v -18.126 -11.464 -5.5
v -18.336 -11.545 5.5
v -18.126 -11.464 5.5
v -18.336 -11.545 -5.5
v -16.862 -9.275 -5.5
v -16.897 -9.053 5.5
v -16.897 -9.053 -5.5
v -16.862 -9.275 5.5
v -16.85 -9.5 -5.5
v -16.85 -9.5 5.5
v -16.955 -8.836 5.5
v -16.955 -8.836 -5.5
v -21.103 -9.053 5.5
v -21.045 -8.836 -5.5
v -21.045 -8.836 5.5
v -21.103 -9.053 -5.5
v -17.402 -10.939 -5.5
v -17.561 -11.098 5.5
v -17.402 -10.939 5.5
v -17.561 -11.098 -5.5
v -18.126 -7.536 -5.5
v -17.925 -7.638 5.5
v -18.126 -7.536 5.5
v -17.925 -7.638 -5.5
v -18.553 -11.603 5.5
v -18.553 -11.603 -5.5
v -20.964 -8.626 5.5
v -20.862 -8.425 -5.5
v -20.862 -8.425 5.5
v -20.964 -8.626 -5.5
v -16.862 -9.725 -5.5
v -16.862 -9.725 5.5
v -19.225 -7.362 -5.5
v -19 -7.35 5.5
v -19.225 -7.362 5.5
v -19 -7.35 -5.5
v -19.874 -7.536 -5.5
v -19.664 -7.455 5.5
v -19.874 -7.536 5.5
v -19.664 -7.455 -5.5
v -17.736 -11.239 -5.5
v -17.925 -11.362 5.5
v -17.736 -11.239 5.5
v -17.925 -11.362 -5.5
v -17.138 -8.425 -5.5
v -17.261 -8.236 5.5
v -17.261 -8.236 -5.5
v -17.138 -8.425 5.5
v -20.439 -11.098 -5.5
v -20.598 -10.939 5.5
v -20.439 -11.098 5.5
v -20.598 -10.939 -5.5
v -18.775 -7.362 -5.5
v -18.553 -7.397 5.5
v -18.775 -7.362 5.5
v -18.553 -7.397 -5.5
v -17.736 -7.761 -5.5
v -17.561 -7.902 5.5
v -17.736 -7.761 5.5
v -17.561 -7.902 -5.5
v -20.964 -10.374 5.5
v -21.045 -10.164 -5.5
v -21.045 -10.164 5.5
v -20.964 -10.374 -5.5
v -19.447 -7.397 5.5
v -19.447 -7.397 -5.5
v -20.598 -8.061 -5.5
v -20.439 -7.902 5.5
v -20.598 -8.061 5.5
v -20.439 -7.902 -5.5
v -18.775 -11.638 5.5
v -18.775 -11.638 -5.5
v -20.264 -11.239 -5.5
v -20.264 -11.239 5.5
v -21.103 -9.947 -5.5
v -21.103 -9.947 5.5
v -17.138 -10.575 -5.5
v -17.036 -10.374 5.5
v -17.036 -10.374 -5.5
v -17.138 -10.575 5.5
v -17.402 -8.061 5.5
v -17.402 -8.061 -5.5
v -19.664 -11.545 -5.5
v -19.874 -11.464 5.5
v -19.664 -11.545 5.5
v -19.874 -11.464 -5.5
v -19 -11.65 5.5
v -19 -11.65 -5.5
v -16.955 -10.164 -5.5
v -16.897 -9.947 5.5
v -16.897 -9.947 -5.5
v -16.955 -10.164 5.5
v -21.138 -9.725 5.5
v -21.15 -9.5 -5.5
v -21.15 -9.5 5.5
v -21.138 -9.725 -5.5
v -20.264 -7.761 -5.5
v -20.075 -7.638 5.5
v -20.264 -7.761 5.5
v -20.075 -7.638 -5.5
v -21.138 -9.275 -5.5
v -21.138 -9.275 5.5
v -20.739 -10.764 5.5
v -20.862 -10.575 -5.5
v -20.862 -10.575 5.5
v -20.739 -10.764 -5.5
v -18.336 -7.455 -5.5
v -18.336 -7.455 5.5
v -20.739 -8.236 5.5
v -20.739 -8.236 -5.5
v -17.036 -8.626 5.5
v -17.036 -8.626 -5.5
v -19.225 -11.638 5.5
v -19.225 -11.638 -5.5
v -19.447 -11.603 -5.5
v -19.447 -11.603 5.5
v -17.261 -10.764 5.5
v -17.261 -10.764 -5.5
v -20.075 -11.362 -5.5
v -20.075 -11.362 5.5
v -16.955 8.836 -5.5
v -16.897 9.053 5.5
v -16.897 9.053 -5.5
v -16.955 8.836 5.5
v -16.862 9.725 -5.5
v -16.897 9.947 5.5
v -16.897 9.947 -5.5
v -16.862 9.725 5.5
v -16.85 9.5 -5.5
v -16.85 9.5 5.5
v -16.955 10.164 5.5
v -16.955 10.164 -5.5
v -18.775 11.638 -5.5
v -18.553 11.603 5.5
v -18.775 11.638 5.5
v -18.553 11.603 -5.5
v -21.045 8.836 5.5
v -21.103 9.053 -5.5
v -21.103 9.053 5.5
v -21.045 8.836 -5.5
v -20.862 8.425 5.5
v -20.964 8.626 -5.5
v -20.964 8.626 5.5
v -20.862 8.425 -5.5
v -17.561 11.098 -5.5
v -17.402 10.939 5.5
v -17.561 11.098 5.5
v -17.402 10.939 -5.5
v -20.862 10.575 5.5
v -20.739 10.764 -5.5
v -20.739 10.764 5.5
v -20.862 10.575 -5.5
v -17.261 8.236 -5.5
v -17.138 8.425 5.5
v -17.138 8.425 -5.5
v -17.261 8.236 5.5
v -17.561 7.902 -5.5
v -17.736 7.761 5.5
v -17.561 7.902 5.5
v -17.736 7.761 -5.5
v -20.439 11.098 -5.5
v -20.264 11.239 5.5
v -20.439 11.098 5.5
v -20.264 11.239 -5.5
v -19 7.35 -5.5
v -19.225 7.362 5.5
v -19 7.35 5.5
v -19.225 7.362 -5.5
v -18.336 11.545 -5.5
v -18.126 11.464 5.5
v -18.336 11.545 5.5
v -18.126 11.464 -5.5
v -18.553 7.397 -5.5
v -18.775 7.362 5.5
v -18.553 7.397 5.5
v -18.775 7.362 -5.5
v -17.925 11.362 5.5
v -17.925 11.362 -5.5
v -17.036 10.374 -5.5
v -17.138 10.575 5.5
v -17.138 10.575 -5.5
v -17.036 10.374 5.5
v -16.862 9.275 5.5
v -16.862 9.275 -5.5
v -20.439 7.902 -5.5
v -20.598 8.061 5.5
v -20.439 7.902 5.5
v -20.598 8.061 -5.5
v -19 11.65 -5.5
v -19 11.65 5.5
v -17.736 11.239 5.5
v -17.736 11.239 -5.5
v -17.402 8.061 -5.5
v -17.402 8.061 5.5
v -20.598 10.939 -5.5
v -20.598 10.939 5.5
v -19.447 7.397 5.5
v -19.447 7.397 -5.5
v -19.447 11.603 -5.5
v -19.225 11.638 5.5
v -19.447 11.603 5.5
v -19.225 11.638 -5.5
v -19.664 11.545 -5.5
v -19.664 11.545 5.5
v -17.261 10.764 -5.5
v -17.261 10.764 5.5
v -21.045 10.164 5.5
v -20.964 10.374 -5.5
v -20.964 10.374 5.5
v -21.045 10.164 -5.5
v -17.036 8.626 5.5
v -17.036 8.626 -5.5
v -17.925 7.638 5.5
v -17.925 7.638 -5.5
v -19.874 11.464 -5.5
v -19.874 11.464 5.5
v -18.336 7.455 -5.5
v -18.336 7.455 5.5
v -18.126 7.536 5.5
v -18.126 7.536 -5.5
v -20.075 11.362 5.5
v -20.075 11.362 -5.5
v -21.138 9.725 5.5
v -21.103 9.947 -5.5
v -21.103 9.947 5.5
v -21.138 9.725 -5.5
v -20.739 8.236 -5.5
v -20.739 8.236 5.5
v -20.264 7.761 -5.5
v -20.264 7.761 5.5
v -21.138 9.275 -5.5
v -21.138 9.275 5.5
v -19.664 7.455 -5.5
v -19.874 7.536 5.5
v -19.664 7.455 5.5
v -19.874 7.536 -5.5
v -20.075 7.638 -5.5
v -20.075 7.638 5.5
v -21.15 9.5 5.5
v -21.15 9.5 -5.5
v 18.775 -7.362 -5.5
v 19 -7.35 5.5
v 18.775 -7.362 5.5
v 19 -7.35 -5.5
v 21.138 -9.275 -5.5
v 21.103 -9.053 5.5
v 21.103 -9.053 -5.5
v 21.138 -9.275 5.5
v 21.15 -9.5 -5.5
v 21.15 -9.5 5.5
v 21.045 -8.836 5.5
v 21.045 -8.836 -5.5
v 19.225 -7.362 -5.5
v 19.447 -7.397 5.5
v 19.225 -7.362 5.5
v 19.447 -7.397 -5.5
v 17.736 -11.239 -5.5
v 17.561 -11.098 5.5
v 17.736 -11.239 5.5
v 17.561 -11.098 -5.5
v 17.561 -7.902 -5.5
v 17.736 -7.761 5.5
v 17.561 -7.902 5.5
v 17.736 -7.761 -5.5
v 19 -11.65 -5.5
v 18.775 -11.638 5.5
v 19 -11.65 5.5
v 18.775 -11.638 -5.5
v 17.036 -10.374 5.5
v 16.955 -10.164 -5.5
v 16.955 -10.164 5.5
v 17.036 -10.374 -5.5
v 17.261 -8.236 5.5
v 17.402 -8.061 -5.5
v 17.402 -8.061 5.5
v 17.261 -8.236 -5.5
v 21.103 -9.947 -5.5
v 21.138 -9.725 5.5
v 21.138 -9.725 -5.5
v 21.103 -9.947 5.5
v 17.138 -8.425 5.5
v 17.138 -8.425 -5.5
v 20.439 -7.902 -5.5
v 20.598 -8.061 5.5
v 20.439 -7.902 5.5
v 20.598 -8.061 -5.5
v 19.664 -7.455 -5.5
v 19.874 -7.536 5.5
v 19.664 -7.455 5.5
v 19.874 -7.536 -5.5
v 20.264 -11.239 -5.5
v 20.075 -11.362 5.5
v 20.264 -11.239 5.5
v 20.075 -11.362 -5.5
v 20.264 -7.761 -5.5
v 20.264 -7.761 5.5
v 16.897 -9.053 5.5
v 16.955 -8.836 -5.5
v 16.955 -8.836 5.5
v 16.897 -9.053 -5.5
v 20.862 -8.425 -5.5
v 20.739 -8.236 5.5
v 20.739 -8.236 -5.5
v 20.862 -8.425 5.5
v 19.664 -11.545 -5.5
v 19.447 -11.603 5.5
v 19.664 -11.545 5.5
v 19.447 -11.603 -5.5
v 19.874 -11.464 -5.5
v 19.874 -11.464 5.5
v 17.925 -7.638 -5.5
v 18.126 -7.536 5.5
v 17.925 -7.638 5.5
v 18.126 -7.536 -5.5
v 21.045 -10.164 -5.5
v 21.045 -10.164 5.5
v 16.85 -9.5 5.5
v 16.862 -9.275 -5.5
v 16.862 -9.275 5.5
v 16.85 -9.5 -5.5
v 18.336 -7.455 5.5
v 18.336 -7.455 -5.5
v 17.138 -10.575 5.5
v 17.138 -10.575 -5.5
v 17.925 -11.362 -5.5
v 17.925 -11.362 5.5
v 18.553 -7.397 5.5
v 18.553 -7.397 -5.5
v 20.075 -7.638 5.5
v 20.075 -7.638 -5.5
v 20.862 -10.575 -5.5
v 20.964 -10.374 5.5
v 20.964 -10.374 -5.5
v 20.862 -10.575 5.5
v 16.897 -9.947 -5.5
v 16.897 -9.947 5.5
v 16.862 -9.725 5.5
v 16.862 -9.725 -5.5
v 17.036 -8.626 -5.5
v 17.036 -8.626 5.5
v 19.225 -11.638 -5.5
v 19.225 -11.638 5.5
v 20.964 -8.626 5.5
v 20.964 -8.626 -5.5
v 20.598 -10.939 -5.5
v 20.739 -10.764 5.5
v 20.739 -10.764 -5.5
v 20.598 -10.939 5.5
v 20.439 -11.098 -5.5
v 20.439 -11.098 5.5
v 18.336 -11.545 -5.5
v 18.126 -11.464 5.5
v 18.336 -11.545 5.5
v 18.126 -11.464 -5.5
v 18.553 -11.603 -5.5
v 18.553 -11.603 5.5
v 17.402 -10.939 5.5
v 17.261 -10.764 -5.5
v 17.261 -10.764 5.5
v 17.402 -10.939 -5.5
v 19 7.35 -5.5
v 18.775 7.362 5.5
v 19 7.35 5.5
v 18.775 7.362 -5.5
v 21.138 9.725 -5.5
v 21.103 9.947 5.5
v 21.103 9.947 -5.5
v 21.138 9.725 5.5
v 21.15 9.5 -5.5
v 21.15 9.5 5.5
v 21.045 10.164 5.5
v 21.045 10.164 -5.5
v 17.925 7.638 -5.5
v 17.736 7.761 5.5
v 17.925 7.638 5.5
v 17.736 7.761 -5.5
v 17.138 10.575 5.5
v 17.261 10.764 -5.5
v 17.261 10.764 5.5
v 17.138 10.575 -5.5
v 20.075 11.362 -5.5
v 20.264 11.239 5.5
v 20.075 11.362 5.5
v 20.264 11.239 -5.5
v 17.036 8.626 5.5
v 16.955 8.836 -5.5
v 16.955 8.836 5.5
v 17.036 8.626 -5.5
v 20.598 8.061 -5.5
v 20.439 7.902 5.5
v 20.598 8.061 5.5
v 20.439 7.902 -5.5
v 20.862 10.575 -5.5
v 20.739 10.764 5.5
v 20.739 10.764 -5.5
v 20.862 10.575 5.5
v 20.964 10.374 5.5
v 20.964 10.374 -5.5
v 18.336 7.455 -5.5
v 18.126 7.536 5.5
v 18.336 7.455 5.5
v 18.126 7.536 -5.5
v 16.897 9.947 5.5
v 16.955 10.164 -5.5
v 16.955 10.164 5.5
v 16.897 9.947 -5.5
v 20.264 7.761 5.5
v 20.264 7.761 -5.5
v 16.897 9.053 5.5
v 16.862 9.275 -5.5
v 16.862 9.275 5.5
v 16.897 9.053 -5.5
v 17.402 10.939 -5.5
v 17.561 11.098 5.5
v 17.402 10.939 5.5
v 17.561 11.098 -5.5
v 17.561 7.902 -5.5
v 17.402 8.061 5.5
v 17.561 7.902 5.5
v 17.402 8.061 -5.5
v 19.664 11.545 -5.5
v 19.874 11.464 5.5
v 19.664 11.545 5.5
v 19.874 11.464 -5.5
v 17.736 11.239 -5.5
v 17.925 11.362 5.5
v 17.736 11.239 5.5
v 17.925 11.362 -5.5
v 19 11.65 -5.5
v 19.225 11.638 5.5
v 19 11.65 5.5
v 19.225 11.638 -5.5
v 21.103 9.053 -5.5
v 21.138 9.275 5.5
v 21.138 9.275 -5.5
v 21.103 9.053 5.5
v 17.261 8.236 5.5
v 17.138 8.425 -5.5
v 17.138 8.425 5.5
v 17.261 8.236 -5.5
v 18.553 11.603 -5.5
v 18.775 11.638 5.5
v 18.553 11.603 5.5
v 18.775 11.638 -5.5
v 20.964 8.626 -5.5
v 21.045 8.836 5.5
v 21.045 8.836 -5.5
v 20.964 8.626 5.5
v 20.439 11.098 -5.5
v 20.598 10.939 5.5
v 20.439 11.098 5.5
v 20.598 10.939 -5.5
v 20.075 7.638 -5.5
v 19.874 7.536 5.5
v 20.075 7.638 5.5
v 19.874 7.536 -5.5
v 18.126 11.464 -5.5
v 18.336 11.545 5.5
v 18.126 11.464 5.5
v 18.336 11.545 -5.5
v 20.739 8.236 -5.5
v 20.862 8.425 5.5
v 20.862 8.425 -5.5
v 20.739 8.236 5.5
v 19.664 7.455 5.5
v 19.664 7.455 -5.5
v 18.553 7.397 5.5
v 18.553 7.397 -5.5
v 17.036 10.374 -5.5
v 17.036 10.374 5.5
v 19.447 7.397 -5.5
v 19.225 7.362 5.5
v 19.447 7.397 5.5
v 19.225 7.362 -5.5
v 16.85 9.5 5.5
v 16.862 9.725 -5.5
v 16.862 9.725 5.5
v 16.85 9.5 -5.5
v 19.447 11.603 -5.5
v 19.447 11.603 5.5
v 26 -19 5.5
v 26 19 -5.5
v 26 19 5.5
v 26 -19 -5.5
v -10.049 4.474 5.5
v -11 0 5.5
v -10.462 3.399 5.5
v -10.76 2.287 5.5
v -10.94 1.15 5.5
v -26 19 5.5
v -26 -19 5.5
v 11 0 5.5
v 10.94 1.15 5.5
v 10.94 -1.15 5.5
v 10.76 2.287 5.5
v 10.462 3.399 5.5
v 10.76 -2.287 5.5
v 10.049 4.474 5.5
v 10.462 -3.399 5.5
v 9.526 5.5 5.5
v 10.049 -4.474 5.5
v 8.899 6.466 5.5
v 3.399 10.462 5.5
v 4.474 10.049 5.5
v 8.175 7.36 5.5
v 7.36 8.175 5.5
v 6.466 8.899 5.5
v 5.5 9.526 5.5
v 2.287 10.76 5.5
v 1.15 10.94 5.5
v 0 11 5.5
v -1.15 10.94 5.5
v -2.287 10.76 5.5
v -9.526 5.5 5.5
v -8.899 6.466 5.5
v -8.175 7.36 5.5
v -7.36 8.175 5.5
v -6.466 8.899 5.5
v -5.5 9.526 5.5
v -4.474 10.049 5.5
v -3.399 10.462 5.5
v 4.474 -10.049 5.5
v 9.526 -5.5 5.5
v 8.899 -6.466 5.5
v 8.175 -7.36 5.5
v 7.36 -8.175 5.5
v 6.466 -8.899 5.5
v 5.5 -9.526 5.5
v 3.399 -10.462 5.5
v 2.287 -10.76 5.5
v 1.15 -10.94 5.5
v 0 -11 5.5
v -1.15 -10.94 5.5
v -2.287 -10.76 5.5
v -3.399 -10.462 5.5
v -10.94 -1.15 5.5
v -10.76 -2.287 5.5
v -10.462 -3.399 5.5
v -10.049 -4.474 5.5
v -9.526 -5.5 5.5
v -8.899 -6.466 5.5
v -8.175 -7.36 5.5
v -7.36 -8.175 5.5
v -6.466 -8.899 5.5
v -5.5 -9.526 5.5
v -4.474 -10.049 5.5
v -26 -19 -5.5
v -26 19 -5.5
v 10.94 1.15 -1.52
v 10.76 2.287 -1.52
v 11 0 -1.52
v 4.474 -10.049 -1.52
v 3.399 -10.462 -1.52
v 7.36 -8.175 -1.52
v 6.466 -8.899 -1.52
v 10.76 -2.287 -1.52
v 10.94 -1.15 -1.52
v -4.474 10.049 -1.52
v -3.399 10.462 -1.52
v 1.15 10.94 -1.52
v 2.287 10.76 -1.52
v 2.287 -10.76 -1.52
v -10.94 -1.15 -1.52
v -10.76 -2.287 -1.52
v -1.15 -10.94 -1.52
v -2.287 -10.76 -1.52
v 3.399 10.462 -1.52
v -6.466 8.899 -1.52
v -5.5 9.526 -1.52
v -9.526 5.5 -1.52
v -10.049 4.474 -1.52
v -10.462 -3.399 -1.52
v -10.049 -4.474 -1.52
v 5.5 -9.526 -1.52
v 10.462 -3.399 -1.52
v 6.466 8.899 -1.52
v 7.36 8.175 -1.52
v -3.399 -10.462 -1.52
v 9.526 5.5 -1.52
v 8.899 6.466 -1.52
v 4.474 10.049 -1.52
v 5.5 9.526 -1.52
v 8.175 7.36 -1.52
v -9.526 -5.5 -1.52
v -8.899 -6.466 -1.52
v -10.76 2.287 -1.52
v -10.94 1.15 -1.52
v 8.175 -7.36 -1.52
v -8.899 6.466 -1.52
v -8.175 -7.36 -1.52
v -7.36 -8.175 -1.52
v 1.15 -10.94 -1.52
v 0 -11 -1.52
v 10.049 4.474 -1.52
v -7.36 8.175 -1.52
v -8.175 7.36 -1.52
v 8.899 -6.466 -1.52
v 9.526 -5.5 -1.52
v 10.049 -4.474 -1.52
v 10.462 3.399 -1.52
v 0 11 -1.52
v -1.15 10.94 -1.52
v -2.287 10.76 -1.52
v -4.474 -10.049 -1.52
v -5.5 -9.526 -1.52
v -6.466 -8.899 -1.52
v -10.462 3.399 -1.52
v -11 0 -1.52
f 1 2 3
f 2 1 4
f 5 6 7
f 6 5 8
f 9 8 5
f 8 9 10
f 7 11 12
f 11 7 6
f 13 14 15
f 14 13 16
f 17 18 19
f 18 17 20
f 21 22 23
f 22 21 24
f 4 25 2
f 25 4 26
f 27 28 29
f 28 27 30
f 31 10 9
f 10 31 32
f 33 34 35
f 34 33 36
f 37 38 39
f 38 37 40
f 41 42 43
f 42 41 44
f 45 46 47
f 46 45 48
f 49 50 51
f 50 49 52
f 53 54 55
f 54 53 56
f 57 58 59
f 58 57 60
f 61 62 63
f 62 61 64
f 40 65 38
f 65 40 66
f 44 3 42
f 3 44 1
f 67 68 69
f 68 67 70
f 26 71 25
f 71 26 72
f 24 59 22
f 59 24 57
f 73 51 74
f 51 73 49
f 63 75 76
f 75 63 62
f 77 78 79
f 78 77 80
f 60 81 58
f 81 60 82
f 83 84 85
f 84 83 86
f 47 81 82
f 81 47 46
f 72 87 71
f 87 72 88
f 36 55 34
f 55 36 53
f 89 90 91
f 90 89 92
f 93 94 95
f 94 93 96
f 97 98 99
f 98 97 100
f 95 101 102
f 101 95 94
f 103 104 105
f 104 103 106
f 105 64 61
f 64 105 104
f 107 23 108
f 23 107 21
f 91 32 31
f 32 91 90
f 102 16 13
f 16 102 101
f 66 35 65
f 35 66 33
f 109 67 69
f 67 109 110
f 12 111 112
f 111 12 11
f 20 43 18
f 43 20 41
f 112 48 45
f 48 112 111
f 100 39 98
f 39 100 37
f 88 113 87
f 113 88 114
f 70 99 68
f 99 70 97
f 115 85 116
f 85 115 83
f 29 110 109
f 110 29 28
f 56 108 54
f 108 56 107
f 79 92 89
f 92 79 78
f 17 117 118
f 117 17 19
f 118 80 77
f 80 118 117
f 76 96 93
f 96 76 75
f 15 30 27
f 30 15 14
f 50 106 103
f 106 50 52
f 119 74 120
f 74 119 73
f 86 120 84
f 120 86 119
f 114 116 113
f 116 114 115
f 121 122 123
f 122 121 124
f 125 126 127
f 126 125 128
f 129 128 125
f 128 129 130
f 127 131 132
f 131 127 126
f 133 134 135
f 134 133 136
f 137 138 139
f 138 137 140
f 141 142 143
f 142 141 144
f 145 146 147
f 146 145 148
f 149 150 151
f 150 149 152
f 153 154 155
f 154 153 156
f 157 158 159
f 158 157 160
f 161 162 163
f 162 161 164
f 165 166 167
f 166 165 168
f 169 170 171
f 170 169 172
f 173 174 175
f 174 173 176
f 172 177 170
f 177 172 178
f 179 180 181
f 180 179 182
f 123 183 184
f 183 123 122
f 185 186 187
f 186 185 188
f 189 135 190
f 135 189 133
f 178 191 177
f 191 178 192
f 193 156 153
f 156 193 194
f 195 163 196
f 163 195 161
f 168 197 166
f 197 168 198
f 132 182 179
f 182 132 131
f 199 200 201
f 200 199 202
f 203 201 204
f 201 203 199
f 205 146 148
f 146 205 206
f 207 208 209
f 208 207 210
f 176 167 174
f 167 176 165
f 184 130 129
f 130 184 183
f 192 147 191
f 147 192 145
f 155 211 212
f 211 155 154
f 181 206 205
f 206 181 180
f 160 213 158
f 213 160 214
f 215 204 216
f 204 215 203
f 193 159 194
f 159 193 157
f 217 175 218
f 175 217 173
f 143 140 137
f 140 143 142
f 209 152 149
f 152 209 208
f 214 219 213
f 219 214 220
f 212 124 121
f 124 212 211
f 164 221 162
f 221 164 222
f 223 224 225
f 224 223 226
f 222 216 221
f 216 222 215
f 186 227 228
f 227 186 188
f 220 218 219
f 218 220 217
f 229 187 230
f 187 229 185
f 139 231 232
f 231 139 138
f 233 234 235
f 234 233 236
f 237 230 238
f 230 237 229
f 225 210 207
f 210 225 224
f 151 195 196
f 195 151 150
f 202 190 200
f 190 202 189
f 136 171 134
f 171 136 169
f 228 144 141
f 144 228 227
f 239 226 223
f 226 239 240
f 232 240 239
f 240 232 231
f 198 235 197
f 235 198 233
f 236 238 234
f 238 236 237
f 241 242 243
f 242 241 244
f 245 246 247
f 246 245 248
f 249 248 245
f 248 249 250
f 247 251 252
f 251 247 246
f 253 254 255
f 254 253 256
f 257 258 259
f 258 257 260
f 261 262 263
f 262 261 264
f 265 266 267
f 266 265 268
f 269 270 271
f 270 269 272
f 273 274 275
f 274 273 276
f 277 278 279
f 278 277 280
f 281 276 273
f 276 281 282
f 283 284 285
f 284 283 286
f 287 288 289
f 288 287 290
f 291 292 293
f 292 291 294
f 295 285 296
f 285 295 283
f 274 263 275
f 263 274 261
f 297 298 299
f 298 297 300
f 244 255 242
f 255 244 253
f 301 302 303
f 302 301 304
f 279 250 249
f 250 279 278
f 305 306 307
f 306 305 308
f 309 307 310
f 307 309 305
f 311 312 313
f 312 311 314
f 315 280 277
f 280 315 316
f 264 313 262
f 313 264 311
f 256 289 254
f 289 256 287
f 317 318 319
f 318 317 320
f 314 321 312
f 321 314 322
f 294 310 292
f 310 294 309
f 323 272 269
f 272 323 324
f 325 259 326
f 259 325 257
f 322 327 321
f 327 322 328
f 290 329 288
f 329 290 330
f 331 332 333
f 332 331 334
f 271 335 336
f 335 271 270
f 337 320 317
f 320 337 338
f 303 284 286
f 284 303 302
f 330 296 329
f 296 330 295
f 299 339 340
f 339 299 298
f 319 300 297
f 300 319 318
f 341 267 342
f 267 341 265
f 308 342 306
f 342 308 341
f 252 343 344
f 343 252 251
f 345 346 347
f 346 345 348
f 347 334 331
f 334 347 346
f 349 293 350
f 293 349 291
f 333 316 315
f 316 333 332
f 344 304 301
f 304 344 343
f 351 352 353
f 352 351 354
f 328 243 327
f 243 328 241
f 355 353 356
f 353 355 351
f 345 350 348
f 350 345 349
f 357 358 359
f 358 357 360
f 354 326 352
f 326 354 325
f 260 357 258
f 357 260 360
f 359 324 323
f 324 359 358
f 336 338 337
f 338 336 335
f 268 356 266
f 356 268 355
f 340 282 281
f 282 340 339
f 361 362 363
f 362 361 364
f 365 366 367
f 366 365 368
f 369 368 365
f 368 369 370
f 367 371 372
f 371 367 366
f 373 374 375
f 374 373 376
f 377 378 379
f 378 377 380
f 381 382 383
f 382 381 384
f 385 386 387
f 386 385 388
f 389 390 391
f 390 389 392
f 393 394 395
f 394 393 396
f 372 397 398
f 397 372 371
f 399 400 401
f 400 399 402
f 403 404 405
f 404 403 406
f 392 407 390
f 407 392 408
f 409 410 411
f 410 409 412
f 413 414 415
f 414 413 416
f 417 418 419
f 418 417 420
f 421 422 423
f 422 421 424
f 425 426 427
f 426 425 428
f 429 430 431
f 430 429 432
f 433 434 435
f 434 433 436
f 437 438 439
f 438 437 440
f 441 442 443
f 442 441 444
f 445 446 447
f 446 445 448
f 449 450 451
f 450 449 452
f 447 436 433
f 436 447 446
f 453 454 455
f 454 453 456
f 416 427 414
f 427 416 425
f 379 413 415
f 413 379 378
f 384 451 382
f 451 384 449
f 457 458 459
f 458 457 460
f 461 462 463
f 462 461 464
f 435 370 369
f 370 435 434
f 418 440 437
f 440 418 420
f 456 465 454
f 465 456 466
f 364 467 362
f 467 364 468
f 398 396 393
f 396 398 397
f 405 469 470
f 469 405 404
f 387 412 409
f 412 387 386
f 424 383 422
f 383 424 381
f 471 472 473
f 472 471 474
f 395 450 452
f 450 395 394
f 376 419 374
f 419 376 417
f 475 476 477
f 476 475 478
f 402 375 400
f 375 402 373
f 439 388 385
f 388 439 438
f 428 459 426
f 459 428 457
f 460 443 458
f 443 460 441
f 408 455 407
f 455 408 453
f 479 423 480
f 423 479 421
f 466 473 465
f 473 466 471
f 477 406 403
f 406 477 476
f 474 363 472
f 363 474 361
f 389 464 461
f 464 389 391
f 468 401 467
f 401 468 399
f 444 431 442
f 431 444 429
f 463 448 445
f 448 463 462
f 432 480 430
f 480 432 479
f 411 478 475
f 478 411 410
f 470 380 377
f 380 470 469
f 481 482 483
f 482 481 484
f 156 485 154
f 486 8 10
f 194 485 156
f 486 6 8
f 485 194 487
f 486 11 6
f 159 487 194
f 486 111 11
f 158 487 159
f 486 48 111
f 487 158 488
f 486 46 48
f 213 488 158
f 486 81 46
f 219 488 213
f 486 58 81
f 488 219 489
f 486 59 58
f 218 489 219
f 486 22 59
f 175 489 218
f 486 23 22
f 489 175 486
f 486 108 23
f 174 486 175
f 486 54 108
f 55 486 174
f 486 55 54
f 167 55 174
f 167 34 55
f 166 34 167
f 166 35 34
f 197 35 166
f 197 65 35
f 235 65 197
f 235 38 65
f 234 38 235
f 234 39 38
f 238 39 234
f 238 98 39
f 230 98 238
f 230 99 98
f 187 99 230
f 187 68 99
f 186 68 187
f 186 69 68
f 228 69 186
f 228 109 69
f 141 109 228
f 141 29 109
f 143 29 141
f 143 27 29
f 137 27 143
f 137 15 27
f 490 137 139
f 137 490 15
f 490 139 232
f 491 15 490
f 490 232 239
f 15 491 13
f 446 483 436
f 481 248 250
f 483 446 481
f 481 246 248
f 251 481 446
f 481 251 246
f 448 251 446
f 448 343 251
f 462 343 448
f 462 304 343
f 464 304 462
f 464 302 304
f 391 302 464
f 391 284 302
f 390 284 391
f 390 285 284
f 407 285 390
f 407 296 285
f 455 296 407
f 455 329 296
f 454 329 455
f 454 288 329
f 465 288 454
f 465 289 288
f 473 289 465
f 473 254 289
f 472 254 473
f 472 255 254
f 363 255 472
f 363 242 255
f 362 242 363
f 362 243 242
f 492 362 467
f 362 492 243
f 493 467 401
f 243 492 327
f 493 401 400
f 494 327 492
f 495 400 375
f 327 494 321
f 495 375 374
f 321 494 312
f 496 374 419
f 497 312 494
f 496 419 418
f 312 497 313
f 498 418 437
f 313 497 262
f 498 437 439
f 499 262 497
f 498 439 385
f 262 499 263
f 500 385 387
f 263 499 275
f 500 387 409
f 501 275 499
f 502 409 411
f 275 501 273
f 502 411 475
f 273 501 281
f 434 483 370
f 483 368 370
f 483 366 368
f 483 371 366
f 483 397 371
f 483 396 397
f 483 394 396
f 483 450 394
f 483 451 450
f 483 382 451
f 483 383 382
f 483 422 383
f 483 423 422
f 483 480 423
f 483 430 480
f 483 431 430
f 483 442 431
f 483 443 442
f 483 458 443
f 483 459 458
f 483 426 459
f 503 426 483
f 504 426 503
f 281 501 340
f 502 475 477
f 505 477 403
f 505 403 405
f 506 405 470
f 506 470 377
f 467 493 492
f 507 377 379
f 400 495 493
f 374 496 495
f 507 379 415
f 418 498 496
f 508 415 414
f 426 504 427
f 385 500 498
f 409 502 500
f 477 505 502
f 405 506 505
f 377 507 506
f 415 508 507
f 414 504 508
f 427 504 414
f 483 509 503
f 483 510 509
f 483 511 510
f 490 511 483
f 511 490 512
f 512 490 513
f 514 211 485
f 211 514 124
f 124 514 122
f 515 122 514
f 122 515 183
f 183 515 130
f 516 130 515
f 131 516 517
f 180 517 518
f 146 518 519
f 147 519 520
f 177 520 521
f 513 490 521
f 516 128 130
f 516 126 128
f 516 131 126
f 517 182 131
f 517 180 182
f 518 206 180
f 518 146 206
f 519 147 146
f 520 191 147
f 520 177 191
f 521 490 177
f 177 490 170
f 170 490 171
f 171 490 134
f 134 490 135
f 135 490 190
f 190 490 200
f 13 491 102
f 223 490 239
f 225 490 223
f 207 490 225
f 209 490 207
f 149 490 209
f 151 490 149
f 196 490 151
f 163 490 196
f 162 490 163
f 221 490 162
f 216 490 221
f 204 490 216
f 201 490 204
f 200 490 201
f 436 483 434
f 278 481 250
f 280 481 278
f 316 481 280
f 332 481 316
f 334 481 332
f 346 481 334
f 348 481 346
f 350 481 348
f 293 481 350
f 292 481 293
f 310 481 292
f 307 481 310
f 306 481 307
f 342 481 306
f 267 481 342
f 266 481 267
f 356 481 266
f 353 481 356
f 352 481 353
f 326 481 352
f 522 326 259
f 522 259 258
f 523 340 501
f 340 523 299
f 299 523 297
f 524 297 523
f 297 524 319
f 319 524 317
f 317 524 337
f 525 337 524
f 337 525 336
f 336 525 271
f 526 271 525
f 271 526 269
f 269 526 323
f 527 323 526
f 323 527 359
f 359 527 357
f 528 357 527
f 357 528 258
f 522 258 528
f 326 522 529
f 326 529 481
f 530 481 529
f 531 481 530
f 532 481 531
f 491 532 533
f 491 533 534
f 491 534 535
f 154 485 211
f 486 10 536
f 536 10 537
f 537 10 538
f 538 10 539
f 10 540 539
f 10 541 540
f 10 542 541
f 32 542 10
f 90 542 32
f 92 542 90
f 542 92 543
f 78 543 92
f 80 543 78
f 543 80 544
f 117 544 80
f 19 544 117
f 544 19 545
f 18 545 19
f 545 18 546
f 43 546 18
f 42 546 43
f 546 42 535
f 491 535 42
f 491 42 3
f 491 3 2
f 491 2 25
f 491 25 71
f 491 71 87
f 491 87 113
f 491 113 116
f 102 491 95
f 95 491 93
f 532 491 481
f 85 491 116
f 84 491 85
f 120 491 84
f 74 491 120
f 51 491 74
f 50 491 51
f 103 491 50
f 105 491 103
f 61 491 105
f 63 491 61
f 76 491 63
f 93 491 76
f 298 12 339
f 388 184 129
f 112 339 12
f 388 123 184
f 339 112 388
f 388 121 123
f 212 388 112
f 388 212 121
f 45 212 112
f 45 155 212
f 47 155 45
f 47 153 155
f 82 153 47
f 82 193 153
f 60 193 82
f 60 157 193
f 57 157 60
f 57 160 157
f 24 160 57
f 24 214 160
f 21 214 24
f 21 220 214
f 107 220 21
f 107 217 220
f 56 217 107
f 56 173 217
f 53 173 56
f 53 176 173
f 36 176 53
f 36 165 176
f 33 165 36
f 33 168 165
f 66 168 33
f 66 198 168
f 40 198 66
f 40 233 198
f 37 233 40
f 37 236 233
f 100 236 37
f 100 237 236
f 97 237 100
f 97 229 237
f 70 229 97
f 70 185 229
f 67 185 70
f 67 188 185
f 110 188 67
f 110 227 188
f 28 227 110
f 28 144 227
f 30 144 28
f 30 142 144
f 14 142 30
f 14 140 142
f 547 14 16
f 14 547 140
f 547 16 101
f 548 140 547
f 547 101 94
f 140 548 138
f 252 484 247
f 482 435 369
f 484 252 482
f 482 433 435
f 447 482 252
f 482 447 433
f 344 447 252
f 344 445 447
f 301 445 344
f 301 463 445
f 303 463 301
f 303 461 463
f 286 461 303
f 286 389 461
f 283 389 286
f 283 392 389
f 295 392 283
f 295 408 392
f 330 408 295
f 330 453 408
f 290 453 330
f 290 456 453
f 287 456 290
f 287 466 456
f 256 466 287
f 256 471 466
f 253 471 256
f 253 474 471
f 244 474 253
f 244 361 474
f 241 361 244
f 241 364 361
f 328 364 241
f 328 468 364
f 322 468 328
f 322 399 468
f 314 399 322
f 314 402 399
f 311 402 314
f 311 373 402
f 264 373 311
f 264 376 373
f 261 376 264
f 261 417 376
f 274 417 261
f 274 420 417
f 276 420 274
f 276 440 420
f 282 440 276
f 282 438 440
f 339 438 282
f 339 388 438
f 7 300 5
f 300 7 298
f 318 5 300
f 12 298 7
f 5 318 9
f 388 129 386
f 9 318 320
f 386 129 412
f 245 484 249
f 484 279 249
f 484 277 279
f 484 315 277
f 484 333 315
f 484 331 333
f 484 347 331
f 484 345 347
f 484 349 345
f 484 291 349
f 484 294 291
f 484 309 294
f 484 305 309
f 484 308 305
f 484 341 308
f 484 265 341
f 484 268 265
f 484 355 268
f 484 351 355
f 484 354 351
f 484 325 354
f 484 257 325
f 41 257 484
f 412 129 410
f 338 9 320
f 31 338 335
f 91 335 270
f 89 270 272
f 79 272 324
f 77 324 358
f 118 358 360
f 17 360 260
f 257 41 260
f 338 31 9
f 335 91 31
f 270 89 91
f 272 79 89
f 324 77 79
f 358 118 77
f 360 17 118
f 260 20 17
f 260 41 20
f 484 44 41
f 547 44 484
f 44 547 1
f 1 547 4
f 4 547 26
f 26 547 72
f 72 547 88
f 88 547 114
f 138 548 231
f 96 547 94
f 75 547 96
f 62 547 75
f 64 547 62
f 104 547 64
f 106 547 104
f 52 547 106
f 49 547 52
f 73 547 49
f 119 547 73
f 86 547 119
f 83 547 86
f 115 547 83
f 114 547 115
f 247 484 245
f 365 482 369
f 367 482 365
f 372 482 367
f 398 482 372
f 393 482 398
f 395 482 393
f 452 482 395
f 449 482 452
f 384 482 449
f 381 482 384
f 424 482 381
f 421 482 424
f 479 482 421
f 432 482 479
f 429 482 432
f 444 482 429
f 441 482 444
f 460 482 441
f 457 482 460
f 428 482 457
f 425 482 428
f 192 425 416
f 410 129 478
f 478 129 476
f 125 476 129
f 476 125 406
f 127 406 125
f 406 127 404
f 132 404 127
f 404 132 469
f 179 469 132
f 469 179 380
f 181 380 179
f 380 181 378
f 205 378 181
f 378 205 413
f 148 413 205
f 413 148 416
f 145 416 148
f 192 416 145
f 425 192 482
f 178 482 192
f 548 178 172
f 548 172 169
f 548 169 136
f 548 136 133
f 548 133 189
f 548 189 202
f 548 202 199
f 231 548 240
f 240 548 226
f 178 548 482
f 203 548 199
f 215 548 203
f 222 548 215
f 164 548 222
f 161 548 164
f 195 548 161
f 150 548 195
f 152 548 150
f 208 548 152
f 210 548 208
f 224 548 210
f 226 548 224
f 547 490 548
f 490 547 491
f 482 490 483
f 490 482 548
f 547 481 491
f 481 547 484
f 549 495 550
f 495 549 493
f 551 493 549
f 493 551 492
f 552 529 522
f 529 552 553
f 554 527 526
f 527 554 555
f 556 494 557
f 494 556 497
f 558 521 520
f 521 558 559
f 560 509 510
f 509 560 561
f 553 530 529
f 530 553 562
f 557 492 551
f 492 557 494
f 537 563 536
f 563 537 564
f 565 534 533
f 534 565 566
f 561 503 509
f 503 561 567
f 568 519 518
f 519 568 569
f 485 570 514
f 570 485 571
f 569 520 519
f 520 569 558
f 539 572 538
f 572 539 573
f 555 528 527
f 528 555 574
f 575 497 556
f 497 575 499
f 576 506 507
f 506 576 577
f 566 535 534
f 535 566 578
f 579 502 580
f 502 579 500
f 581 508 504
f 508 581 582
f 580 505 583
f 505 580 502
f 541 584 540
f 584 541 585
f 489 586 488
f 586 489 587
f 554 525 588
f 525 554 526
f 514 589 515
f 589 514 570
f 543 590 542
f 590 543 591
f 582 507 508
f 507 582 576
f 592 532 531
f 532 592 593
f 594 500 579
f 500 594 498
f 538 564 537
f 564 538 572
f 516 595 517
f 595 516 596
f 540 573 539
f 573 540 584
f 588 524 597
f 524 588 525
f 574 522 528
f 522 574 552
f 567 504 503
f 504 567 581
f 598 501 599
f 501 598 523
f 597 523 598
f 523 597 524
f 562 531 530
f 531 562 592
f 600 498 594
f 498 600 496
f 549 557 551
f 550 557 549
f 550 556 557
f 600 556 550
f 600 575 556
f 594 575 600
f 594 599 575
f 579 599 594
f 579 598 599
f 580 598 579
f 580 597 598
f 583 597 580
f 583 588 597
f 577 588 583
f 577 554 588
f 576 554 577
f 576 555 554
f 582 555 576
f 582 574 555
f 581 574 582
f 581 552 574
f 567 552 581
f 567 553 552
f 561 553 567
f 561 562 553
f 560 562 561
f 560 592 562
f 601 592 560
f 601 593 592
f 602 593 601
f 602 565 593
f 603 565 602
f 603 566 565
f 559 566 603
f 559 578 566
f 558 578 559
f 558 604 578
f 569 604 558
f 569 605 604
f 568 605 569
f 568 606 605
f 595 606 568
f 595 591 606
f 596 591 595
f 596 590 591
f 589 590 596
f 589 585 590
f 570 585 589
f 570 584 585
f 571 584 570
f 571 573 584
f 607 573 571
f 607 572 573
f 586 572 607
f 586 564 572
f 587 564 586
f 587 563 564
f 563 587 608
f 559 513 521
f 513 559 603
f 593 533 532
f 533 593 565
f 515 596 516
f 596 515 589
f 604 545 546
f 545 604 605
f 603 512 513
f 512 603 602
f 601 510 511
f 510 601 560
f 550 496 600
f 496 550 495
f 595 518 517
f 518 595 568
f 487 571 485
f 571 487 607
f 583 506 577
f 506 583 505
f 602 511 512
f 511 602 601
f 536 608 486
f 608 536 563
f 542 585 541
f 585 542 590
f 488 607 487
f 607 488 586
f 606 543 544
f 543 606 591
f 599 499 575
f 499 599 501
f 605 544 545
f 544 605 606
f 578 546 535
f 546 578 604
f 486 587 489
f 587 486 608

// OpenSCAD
// Lead-screw nut holder with 22 mm pocket.
$fn = 60;
eps = 0.02;
body_l = 52;
body_w = 38;
body_t = 11;
pocket_d = 22;
pocket_depth = 7;
mount_x = 19.0;
difference() {
    cube([body_l, body_w, body_t], center = true);
    translate([0, 0, body_t / 2 - pocket_depth - eps]) cylinder(d = pocket_d, h = pocket_depth + 2 * eps);
    for (x = [-mount_x, mount_x], y = [-body_w / 4, body_w / 4])
        translate([x, y, -body_t / 2 - eps]) cylinder(d = 4.3, h = body_t + 2 * eps);
}
